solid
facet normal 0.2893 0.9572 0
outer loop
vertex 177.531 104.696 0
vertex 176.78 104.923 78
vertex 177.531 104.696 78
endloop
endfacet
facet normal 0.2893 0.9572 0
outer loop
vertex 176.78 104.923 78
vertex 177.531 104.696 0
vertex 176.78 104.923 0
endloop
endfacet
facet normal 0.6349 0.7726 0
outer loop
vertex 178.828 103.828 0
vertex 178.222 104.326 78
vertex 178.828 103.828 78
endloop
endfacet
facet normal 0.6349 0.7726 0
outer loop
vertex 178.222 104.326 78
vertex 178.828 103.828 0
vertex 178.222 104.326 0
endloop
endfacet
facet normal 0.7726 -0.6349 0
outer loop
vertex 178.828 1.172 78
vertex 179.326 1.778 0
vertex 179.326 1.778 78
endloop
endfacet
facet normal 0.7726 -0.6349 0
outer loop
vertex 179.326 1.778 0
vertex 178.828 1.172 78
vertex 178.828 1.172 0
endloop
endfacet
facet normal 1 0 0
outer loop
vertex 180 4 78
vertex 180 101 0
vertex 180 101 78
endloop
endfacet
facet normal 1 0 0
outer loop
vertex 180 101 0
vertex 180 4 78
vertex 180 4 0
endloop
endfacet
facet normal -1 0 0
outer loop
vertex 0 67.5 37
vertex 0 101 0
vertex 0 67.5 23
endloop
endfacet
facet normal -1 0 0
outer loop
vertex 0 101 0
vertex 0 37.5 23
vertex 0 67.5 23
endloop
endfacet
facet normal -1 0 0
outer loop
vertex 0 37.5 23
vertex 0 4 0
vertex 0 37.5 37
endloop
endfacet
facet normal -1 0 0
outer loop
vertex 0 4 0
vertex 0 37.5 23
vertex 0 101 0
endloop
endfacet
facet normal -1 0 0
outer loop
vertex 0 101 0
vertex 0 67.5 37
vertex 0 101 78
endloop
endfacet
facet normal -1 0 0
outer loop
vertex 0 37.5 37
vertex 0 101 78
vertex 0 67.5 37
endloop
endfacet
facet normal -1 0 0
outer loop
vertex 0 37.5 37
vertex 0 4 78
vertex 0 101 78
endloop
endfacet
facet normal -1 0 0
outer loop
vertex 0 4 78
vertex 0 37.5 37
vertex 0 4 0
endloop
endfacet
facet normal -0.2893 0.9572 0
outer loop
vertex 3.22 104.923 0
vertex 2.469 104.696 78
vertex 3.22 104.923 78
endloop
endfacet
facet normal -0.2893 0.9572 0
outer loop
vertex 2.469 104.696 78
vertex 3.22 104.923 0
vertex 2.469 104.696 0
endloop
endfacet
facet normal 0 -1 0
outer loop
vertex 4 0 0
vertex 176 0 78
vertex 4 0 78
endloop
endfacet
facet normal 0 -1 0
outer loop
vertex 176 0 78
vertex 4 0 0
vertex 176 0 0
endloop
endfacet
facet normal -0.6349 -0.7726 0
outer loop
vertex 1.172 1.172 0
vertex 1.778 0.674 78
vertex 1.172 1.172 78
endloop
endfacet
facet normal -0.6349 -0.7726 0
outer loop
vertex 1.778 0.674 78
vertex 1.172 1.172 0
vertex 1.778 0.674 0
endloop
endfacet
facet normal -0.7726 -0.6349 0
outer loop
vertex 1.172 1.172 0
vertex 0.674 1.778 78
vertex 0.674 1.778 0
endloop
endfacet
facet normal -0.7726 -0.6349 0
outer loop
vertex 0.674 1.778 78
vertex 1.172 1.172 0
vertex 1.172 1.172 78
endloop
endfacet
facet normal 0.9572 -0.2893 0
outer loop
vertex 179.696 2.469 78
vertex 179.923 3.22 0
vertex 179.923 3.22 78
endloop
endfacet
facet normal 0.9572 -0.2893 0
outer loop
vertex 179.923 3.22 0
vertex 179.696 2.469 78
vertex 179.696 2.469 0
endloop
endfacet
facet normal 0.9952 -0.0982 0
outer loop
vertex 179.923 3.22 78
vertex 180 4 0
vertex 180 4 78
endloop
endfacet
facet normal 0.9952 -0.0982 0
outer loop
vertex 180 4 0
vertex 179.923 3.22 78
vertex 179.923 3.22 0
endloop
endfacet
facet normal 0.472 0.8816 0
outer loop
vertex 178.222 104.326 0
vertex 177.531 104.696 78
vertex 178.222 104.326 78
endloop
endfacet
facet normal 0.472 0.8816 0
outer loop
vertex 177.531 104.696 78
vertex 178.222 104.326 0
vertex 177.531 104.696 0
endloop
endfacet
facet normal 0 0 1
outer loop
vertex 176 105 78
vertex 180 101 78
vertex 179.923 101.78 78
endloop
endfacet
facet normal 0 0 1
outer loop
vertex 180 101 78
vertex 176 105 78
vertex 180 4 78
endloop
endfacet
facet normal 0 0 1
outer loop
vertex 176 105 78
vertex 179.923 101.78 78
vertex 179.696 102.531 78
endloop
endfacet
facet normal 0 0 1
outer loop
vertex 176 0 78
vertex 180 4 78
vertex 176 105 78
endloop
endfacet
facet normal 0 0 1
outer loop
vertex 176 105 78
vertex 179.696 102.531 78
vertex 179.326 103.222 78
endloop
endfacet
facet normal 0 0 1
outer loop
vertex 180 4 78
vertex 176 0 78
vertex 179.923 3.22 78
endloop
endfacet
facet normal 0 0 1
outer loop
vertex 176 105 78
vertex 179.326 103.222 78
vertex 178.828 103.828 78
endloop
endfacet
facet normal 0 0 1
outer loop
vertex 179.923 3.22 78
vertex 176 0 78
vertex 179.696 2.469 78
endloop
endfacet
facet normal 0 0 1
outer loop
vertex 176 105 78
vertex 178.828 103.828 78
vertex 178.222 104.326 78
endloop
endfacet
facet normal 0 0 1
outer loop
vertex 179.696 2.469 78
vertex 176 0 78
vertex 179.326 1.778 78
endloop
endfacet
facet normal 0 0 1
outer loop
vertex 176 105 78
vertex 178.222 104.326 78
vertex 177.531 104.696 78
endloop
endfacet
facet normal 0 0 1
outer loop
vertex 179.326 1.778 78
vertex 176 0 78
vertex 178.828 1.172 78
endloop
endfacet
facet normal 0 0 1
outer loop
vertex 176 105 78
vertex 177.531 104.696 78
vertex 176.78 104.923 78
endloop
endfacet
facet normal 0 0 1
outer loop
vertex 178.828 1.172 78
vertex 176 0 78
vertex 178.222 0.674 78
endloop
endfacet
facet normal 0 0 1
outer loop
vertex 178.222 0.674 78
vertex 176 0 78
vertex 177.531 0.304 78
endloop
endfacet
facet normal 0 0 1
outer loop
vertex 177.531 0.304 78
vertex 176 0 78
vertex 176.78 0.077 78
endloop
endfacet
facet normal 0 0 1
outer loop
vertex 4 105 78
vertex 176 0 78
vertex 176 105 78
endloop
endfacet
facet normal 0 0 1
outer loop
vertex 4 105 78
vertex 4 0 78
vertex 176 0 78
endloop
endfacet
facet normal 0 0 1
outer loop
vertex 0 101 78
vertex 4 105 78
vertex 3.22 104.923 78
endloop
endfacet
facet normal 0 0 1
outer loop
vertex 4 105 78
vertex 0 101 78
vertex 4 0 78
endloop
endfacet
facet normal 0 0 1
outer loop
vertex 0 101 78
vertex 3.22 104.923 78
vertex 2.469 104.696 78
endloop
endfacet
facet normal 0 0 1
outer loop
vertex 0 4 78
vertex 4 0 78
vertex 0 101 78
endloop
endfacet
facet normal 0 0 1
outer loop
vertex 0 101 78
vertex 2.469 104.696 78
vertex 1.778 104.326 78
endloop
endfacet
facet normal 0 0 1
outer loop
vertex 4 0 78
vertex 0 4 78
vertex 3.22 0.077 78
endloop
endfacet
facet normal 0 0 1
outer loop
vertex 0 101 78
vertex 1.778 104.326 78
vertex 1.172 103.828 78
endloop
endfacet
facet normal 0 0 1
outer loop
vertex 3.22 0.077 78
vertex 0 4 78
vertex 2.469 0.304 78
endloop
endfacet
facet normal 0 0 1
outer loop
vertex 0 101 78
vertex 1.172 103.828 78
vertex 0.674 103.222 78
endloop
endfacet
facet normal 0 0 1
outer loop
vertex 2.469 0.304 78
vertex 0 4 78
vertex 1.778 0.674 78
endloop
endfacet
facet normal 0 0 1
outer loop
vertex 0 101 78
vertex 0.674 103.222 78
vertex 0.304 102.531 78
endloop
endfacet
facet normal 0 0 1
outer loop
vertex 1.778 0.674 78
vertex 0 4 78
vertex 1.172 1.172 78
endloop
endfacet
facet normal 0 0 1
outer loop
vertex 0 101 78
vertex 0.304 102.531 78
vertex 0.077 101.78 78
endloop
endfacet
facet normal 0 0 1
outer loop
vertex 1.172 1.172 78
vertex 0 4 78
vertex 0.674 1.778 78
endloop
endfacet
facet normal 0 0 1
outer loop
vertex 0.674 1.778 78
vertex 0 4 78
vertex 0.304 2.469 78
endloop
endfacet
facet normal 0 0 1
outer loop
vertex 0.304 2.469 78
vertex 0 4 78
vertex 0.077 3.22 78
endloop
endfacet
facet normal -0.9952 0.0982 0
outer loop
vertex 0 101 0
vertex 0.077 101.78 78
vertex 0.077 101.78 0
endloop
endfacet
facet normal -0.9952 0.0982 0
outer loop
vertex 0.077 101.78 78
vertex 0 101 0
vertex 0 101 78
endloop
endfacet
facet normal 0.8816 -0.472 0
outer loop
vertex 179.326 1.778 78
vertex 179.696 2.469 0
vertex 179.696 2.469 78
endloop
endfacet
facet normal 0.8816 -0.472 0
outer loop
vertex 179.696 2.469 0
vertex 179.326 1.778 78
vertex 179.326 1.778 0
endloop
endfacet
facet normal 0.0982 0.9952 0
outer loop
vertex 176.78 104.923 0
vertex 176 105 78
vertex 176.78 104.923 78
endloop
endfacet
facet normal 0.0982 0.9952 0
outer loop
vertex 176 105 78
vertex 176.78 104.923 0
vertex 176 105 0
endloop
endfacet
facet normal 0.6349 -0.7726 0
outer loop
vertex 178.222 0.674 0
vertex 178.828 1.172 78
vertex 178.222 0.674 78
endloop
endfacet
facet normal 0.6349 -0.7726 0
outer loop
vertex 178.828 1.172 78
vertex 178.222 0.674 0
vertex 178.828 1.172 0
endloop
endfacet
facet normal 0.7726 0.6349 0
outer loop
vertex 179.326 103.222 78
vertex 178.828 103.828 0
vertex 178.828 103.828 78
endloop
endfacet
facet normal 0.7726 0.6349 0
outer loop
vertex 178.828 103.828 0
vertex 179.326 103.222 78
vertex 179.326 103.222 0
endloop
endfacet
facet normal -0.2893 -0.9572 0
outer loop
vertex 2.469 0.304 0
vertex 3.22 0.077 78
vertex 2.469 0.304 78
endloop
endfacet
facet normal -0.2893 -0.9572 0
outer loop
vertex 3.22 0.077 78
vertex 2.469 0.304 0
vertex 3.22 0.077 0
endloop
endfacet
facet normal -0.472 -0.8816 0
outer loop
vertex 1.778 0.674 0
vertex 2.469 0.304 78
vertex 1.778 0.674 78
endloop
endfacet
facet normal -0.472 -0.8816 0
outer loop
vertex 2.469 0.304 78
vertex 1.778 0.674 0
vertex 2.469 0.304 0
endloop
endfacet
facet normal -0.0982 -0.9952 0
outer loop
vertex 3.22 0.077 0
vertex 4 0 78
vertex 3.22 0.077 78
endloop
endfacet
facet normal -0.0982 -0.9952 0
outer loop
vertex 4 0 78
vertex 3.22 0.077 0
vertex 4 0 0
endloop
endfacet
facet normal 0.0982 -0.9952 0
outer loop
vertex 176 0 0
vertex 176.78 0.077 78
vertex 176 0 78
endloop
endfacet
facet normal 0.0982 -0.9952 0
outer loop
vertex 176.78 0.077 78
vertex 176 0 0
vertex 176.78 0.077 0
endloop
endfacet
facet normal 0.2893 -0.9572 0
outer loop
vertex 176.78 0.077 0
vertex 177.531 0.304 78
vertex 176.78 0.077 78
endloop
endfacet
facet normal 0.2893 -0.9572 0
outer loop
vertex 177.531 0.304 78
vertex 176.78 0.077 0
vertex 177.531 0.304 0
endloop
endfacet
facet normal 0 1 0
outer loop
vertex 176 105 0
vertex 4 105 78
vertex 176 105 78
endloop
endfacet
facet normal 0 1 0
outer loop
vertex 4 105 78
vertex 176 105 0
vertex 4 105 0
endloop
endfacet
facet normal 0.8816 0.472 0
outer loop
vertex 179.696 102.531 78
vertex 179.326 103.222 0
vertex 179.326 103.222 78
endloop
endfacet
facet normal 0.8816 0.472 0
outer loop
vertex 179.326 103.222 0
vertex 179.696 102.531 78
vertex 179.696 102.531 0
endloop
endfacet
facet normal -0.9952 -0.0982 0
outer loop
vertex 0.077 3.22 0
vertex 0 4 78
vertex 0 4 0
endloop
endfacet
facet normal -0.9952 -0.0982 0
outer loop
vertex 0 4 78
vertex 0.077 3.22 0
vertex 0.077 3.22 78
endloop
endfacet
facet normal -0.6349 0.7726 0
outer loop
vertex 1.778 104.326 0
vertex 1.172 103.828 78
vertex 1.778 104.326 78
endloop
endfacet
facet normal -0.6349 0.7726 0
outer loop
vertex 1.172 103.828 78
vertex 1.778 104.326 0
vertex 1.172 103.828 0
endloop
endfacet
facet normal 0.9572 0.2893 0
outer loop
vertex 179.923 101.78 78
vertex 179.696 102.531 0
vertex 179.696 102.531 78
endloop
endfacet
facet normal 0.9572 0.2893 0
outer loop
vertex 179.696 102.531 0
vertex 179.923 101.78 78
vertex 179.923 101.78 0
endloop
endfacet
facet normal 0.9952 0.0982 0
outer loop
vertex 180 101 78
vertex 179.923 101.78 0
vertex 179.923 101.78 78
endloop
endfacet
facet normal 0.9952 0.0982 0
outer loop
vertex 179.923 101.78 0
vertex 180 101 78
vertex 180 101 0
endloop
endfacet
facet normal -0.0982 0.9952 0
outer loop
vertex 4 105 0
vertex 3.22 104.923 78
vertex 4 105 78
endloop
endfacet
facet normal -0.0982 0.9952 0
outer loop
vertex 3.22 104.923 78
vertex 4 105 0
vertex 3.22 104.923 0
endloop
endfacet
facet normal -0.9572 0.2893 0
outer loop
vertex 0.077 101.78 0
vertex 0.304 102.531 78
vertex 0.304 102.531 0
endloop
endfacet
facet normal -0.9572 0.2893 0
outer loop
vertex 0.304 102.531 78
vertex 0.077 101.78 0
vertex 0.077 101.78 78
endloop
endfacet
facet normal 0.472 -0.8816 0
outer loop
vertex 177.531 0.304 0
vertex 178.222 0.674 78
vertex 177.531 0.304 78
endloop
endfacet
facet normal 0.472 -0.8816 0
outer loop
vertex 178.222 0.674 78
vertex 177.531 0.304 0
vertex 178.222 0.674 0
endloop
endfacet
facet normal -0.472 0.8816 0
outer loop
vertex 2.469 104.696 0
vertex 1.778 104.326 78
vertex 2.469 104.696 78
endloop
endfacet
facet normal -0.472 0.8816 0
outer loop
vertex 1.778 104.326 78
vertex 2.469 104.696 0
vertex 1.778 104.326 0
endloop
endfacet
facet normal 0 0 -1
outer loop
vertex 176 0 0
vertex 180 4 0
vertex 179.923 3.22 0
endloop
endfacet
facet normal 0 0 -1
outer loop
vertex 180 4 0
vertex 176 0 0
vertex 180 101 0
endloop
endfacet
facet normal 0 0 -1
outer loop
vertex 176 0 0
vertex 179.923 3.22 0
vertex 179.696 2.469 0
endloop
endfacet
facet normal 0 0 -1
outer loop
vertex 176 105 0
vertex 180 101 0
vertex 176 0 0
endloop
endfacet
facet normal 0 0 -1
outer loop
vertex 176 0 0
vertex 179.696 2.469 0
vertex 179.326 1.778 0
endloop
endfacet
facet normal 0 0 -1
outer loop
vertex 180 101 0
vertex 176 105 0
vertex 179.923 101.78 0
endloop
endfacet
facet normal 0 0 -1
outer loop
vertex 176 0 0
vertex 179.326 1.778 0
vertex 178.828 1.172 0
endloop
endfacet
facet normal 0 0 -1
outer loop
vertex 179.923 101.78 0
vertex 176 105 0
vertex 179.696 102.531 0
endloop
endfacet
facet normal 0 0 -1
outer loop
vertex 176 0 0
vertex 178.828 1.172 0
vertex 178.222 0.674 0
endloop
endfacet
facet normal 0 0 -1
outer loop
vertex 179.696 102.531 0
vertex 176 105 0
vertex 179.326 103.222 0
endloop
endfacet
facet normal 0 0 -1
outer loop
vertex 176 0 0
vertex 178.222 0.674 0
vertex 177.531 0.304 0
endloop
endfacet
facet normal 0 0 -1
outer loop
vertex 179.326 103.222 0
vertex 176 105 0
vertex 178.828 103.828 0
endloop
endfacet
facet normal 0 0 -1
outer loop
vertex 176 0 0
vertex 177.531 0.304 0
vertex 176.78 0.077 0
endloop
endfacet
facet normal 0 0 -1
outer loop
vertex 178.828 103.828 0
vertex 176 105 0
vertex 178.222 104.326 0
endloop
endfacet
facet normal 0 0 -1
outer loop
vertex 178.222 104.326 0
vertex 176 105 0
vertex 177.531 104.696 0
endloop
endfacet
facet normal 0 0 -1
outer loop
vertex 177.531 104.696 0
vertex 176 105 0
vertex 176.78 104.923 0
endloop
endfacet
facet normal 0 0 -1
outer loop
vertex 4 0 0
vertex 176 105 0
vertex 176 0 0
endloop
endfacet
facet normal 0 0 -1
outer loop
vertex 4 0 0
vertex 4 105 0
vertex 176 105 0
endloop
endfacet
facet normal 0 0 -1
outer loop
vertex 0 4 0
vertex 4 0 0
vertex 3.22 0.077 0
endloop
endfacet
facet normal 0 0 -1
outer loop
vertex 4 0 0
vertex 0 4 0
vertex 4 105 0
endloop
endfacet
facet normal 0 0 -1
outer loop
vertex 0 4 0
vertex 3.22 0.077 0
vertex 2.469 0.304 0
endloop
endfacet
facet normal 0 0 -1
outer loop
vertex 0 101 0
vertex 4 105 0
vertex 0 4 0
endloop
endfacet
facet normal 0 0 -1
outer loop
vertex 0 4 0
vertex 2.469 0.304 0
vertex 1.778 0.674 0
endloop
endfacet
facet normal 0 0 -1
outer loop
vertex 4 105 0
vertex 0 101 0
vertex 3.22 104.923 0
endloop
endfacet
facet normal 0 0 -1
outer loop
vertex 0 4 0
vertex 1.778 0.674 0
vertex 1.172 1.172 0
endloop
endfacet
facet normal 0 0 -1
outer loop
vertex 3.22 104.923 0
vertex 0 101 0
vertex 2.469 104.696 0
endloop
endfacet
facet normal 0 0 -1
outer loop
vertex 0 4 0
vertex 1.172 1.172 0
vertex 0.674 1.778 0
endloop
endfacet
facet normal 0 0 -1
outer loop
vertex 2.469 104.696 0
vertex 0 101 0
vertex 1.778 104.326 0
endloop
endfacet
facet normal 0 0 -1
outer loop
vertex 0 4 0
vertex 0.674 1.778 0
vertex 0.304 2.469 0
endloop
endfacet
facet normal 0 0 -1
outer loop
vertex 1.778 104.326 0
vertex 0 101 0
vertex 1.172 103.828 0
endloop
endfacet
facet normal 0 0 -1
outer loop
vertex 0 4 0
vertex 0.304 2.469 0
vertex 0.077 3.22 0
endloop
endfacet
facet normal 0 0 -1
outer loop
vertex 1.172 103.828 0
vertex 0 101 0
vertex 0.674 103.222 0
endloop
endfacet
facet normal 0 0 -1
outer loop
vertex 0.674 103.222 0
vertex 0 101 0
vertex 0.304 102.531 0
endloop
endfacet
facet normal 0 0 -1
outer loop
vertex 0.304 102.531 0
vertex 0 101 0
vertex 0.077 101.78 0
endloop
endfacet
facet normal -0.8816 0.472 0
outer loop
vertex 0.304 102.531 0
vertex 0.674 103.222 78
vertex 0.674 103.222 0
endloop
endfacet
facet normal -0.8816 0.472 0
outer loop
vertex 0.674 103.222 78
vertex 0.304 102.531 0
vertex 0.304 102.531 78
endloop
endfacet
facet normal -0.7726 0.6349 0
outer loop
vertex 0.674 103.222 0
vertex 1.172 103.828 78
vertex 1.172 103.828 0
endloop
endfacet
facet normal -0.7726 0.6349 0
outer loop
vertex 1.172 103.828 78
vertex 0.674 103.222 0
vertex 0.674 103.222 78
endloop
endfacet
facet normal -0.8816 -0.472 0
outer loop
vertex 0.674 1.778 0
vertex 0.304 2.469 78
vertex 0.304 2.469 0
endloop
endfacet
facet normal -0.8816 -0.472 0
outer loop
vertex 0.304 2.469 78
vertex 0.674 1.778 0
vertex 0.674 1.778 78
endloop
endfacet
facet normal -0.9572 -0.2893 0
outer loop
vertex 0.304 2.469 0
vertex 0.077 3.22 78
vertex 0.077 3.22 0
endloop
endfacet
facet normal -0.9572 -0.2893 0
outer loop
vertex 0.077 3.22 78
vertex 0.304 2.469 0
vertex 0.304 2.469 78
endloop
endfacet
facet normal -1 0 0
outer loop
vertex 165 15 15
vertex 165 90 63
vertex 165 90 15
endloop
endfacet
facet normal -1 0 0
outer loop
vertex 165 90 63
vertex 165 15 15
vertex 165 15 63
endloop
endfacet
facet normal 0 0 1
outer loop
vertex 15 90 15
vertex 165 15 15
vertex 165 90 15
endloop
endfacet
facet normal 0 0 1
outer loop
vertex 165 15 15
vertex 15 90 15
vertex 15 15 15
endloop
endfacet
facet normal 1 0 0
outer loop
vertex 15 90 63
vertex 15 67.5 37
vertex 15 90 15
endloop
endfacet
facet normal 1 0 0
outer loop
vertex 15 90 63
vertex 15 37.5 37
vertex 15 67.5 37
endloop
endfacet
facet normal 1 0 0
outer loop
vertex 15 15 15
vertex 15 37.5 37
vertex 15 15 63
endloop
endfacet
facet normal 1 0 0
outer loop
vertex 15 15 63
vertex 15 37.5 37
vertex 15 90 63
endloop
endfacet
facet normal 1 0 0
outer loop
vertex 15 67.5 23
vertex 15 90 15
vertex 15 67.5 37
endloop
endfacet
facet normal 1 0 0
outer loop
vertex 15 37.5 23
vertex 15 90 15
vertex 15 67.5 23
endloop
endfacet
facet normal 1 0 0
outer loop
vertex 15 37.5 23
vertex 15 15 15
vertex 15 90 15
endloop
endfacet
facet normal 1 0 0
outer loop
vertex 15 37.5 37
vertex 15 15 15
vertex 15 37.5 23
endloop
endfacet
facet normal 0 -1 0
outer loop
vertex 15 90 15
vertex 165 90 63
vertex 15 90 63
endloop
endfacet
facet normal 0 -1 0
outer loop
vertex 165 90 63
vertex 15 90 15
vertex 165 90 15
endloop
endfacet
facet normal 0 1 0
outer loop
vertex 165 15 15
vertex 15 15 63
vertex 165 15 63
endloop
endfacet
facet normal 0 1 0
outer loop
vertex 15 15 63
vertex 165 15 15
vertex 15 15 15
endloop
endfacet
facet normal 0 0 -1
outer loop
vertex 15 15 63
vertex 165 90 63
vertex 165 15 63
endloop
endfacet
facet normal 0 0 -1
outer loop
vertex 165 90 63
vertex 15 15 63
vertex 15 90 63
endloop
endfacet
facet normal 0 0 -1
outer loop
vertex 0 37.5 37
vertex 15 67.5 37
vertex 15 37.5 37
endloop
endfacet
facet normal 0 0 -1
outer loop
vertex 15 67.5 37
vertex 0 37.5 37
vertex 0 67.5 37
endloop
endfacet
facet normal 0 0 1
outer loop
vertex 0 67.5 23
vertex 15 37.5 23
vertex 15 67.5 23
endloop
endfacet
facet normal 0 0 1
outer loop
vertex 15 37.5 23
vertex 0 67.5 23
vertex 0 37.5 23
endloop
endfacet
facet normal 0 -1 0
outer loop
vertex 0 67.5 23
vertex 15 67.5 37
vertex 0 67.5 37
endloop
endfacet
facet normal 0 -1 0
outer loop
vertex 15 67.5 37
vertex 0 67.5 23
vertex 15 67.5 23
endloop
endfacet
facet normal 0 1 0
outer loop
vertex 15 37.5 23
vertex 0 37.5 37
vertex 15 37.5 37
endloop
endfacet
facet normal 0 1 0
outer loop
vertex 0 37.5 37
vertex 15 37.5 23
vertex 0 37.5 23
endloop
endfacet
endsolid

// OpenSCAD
// Batterihylse med isolasjon og PCM-lomme (prototype, mm)
// Batteri-dimensjoner er eksempel (6S). Sett fra batteriets datablad.
$fn = 32;

BL     = 150;   // batterilengde
BW     = 75;    // batteribredde
BH     = 40;    // batterihøyde
INS    = 15;    // isolasjonstykkelse rundt
PCM_T  = 8;     // PCM-lomme over batteriet
R_CORN = 4;     // hjørneradius på ytterskall

module rbox(size, r = R_CORN) {
    hull()
        for (x = [r, size[0] - r], y = [r, size[1] - r])
            translate([x, y, 0]) cylinder(r = r, h = size[2]);
}

OUT_X = BL + 2 * INS;
OUT_Y = BW + 2 * INS;
OUT_Z = BH + 2 * INS + PCM_T;

difference() {
    rbox([OUT_X, OUT_Y, OUT_Z]);

    // batterikammer
    translate([INS, INS, INS]) cube([BL, BW, BH]);

    // PCM-lomme over batteriet
    translate([INS, INS, INS + BH]) cube([BL, BW, PCM_T]);

    // kontaktspor i ene kortside
    translate([-1, OUT_Y / 2 - 15, INS + 8]) cube([INS + 2, 30, 14]);
}

// TODO: lokk (separat del), varmeelement-kanal, kondens-ventil, temperatursensor-hull.
